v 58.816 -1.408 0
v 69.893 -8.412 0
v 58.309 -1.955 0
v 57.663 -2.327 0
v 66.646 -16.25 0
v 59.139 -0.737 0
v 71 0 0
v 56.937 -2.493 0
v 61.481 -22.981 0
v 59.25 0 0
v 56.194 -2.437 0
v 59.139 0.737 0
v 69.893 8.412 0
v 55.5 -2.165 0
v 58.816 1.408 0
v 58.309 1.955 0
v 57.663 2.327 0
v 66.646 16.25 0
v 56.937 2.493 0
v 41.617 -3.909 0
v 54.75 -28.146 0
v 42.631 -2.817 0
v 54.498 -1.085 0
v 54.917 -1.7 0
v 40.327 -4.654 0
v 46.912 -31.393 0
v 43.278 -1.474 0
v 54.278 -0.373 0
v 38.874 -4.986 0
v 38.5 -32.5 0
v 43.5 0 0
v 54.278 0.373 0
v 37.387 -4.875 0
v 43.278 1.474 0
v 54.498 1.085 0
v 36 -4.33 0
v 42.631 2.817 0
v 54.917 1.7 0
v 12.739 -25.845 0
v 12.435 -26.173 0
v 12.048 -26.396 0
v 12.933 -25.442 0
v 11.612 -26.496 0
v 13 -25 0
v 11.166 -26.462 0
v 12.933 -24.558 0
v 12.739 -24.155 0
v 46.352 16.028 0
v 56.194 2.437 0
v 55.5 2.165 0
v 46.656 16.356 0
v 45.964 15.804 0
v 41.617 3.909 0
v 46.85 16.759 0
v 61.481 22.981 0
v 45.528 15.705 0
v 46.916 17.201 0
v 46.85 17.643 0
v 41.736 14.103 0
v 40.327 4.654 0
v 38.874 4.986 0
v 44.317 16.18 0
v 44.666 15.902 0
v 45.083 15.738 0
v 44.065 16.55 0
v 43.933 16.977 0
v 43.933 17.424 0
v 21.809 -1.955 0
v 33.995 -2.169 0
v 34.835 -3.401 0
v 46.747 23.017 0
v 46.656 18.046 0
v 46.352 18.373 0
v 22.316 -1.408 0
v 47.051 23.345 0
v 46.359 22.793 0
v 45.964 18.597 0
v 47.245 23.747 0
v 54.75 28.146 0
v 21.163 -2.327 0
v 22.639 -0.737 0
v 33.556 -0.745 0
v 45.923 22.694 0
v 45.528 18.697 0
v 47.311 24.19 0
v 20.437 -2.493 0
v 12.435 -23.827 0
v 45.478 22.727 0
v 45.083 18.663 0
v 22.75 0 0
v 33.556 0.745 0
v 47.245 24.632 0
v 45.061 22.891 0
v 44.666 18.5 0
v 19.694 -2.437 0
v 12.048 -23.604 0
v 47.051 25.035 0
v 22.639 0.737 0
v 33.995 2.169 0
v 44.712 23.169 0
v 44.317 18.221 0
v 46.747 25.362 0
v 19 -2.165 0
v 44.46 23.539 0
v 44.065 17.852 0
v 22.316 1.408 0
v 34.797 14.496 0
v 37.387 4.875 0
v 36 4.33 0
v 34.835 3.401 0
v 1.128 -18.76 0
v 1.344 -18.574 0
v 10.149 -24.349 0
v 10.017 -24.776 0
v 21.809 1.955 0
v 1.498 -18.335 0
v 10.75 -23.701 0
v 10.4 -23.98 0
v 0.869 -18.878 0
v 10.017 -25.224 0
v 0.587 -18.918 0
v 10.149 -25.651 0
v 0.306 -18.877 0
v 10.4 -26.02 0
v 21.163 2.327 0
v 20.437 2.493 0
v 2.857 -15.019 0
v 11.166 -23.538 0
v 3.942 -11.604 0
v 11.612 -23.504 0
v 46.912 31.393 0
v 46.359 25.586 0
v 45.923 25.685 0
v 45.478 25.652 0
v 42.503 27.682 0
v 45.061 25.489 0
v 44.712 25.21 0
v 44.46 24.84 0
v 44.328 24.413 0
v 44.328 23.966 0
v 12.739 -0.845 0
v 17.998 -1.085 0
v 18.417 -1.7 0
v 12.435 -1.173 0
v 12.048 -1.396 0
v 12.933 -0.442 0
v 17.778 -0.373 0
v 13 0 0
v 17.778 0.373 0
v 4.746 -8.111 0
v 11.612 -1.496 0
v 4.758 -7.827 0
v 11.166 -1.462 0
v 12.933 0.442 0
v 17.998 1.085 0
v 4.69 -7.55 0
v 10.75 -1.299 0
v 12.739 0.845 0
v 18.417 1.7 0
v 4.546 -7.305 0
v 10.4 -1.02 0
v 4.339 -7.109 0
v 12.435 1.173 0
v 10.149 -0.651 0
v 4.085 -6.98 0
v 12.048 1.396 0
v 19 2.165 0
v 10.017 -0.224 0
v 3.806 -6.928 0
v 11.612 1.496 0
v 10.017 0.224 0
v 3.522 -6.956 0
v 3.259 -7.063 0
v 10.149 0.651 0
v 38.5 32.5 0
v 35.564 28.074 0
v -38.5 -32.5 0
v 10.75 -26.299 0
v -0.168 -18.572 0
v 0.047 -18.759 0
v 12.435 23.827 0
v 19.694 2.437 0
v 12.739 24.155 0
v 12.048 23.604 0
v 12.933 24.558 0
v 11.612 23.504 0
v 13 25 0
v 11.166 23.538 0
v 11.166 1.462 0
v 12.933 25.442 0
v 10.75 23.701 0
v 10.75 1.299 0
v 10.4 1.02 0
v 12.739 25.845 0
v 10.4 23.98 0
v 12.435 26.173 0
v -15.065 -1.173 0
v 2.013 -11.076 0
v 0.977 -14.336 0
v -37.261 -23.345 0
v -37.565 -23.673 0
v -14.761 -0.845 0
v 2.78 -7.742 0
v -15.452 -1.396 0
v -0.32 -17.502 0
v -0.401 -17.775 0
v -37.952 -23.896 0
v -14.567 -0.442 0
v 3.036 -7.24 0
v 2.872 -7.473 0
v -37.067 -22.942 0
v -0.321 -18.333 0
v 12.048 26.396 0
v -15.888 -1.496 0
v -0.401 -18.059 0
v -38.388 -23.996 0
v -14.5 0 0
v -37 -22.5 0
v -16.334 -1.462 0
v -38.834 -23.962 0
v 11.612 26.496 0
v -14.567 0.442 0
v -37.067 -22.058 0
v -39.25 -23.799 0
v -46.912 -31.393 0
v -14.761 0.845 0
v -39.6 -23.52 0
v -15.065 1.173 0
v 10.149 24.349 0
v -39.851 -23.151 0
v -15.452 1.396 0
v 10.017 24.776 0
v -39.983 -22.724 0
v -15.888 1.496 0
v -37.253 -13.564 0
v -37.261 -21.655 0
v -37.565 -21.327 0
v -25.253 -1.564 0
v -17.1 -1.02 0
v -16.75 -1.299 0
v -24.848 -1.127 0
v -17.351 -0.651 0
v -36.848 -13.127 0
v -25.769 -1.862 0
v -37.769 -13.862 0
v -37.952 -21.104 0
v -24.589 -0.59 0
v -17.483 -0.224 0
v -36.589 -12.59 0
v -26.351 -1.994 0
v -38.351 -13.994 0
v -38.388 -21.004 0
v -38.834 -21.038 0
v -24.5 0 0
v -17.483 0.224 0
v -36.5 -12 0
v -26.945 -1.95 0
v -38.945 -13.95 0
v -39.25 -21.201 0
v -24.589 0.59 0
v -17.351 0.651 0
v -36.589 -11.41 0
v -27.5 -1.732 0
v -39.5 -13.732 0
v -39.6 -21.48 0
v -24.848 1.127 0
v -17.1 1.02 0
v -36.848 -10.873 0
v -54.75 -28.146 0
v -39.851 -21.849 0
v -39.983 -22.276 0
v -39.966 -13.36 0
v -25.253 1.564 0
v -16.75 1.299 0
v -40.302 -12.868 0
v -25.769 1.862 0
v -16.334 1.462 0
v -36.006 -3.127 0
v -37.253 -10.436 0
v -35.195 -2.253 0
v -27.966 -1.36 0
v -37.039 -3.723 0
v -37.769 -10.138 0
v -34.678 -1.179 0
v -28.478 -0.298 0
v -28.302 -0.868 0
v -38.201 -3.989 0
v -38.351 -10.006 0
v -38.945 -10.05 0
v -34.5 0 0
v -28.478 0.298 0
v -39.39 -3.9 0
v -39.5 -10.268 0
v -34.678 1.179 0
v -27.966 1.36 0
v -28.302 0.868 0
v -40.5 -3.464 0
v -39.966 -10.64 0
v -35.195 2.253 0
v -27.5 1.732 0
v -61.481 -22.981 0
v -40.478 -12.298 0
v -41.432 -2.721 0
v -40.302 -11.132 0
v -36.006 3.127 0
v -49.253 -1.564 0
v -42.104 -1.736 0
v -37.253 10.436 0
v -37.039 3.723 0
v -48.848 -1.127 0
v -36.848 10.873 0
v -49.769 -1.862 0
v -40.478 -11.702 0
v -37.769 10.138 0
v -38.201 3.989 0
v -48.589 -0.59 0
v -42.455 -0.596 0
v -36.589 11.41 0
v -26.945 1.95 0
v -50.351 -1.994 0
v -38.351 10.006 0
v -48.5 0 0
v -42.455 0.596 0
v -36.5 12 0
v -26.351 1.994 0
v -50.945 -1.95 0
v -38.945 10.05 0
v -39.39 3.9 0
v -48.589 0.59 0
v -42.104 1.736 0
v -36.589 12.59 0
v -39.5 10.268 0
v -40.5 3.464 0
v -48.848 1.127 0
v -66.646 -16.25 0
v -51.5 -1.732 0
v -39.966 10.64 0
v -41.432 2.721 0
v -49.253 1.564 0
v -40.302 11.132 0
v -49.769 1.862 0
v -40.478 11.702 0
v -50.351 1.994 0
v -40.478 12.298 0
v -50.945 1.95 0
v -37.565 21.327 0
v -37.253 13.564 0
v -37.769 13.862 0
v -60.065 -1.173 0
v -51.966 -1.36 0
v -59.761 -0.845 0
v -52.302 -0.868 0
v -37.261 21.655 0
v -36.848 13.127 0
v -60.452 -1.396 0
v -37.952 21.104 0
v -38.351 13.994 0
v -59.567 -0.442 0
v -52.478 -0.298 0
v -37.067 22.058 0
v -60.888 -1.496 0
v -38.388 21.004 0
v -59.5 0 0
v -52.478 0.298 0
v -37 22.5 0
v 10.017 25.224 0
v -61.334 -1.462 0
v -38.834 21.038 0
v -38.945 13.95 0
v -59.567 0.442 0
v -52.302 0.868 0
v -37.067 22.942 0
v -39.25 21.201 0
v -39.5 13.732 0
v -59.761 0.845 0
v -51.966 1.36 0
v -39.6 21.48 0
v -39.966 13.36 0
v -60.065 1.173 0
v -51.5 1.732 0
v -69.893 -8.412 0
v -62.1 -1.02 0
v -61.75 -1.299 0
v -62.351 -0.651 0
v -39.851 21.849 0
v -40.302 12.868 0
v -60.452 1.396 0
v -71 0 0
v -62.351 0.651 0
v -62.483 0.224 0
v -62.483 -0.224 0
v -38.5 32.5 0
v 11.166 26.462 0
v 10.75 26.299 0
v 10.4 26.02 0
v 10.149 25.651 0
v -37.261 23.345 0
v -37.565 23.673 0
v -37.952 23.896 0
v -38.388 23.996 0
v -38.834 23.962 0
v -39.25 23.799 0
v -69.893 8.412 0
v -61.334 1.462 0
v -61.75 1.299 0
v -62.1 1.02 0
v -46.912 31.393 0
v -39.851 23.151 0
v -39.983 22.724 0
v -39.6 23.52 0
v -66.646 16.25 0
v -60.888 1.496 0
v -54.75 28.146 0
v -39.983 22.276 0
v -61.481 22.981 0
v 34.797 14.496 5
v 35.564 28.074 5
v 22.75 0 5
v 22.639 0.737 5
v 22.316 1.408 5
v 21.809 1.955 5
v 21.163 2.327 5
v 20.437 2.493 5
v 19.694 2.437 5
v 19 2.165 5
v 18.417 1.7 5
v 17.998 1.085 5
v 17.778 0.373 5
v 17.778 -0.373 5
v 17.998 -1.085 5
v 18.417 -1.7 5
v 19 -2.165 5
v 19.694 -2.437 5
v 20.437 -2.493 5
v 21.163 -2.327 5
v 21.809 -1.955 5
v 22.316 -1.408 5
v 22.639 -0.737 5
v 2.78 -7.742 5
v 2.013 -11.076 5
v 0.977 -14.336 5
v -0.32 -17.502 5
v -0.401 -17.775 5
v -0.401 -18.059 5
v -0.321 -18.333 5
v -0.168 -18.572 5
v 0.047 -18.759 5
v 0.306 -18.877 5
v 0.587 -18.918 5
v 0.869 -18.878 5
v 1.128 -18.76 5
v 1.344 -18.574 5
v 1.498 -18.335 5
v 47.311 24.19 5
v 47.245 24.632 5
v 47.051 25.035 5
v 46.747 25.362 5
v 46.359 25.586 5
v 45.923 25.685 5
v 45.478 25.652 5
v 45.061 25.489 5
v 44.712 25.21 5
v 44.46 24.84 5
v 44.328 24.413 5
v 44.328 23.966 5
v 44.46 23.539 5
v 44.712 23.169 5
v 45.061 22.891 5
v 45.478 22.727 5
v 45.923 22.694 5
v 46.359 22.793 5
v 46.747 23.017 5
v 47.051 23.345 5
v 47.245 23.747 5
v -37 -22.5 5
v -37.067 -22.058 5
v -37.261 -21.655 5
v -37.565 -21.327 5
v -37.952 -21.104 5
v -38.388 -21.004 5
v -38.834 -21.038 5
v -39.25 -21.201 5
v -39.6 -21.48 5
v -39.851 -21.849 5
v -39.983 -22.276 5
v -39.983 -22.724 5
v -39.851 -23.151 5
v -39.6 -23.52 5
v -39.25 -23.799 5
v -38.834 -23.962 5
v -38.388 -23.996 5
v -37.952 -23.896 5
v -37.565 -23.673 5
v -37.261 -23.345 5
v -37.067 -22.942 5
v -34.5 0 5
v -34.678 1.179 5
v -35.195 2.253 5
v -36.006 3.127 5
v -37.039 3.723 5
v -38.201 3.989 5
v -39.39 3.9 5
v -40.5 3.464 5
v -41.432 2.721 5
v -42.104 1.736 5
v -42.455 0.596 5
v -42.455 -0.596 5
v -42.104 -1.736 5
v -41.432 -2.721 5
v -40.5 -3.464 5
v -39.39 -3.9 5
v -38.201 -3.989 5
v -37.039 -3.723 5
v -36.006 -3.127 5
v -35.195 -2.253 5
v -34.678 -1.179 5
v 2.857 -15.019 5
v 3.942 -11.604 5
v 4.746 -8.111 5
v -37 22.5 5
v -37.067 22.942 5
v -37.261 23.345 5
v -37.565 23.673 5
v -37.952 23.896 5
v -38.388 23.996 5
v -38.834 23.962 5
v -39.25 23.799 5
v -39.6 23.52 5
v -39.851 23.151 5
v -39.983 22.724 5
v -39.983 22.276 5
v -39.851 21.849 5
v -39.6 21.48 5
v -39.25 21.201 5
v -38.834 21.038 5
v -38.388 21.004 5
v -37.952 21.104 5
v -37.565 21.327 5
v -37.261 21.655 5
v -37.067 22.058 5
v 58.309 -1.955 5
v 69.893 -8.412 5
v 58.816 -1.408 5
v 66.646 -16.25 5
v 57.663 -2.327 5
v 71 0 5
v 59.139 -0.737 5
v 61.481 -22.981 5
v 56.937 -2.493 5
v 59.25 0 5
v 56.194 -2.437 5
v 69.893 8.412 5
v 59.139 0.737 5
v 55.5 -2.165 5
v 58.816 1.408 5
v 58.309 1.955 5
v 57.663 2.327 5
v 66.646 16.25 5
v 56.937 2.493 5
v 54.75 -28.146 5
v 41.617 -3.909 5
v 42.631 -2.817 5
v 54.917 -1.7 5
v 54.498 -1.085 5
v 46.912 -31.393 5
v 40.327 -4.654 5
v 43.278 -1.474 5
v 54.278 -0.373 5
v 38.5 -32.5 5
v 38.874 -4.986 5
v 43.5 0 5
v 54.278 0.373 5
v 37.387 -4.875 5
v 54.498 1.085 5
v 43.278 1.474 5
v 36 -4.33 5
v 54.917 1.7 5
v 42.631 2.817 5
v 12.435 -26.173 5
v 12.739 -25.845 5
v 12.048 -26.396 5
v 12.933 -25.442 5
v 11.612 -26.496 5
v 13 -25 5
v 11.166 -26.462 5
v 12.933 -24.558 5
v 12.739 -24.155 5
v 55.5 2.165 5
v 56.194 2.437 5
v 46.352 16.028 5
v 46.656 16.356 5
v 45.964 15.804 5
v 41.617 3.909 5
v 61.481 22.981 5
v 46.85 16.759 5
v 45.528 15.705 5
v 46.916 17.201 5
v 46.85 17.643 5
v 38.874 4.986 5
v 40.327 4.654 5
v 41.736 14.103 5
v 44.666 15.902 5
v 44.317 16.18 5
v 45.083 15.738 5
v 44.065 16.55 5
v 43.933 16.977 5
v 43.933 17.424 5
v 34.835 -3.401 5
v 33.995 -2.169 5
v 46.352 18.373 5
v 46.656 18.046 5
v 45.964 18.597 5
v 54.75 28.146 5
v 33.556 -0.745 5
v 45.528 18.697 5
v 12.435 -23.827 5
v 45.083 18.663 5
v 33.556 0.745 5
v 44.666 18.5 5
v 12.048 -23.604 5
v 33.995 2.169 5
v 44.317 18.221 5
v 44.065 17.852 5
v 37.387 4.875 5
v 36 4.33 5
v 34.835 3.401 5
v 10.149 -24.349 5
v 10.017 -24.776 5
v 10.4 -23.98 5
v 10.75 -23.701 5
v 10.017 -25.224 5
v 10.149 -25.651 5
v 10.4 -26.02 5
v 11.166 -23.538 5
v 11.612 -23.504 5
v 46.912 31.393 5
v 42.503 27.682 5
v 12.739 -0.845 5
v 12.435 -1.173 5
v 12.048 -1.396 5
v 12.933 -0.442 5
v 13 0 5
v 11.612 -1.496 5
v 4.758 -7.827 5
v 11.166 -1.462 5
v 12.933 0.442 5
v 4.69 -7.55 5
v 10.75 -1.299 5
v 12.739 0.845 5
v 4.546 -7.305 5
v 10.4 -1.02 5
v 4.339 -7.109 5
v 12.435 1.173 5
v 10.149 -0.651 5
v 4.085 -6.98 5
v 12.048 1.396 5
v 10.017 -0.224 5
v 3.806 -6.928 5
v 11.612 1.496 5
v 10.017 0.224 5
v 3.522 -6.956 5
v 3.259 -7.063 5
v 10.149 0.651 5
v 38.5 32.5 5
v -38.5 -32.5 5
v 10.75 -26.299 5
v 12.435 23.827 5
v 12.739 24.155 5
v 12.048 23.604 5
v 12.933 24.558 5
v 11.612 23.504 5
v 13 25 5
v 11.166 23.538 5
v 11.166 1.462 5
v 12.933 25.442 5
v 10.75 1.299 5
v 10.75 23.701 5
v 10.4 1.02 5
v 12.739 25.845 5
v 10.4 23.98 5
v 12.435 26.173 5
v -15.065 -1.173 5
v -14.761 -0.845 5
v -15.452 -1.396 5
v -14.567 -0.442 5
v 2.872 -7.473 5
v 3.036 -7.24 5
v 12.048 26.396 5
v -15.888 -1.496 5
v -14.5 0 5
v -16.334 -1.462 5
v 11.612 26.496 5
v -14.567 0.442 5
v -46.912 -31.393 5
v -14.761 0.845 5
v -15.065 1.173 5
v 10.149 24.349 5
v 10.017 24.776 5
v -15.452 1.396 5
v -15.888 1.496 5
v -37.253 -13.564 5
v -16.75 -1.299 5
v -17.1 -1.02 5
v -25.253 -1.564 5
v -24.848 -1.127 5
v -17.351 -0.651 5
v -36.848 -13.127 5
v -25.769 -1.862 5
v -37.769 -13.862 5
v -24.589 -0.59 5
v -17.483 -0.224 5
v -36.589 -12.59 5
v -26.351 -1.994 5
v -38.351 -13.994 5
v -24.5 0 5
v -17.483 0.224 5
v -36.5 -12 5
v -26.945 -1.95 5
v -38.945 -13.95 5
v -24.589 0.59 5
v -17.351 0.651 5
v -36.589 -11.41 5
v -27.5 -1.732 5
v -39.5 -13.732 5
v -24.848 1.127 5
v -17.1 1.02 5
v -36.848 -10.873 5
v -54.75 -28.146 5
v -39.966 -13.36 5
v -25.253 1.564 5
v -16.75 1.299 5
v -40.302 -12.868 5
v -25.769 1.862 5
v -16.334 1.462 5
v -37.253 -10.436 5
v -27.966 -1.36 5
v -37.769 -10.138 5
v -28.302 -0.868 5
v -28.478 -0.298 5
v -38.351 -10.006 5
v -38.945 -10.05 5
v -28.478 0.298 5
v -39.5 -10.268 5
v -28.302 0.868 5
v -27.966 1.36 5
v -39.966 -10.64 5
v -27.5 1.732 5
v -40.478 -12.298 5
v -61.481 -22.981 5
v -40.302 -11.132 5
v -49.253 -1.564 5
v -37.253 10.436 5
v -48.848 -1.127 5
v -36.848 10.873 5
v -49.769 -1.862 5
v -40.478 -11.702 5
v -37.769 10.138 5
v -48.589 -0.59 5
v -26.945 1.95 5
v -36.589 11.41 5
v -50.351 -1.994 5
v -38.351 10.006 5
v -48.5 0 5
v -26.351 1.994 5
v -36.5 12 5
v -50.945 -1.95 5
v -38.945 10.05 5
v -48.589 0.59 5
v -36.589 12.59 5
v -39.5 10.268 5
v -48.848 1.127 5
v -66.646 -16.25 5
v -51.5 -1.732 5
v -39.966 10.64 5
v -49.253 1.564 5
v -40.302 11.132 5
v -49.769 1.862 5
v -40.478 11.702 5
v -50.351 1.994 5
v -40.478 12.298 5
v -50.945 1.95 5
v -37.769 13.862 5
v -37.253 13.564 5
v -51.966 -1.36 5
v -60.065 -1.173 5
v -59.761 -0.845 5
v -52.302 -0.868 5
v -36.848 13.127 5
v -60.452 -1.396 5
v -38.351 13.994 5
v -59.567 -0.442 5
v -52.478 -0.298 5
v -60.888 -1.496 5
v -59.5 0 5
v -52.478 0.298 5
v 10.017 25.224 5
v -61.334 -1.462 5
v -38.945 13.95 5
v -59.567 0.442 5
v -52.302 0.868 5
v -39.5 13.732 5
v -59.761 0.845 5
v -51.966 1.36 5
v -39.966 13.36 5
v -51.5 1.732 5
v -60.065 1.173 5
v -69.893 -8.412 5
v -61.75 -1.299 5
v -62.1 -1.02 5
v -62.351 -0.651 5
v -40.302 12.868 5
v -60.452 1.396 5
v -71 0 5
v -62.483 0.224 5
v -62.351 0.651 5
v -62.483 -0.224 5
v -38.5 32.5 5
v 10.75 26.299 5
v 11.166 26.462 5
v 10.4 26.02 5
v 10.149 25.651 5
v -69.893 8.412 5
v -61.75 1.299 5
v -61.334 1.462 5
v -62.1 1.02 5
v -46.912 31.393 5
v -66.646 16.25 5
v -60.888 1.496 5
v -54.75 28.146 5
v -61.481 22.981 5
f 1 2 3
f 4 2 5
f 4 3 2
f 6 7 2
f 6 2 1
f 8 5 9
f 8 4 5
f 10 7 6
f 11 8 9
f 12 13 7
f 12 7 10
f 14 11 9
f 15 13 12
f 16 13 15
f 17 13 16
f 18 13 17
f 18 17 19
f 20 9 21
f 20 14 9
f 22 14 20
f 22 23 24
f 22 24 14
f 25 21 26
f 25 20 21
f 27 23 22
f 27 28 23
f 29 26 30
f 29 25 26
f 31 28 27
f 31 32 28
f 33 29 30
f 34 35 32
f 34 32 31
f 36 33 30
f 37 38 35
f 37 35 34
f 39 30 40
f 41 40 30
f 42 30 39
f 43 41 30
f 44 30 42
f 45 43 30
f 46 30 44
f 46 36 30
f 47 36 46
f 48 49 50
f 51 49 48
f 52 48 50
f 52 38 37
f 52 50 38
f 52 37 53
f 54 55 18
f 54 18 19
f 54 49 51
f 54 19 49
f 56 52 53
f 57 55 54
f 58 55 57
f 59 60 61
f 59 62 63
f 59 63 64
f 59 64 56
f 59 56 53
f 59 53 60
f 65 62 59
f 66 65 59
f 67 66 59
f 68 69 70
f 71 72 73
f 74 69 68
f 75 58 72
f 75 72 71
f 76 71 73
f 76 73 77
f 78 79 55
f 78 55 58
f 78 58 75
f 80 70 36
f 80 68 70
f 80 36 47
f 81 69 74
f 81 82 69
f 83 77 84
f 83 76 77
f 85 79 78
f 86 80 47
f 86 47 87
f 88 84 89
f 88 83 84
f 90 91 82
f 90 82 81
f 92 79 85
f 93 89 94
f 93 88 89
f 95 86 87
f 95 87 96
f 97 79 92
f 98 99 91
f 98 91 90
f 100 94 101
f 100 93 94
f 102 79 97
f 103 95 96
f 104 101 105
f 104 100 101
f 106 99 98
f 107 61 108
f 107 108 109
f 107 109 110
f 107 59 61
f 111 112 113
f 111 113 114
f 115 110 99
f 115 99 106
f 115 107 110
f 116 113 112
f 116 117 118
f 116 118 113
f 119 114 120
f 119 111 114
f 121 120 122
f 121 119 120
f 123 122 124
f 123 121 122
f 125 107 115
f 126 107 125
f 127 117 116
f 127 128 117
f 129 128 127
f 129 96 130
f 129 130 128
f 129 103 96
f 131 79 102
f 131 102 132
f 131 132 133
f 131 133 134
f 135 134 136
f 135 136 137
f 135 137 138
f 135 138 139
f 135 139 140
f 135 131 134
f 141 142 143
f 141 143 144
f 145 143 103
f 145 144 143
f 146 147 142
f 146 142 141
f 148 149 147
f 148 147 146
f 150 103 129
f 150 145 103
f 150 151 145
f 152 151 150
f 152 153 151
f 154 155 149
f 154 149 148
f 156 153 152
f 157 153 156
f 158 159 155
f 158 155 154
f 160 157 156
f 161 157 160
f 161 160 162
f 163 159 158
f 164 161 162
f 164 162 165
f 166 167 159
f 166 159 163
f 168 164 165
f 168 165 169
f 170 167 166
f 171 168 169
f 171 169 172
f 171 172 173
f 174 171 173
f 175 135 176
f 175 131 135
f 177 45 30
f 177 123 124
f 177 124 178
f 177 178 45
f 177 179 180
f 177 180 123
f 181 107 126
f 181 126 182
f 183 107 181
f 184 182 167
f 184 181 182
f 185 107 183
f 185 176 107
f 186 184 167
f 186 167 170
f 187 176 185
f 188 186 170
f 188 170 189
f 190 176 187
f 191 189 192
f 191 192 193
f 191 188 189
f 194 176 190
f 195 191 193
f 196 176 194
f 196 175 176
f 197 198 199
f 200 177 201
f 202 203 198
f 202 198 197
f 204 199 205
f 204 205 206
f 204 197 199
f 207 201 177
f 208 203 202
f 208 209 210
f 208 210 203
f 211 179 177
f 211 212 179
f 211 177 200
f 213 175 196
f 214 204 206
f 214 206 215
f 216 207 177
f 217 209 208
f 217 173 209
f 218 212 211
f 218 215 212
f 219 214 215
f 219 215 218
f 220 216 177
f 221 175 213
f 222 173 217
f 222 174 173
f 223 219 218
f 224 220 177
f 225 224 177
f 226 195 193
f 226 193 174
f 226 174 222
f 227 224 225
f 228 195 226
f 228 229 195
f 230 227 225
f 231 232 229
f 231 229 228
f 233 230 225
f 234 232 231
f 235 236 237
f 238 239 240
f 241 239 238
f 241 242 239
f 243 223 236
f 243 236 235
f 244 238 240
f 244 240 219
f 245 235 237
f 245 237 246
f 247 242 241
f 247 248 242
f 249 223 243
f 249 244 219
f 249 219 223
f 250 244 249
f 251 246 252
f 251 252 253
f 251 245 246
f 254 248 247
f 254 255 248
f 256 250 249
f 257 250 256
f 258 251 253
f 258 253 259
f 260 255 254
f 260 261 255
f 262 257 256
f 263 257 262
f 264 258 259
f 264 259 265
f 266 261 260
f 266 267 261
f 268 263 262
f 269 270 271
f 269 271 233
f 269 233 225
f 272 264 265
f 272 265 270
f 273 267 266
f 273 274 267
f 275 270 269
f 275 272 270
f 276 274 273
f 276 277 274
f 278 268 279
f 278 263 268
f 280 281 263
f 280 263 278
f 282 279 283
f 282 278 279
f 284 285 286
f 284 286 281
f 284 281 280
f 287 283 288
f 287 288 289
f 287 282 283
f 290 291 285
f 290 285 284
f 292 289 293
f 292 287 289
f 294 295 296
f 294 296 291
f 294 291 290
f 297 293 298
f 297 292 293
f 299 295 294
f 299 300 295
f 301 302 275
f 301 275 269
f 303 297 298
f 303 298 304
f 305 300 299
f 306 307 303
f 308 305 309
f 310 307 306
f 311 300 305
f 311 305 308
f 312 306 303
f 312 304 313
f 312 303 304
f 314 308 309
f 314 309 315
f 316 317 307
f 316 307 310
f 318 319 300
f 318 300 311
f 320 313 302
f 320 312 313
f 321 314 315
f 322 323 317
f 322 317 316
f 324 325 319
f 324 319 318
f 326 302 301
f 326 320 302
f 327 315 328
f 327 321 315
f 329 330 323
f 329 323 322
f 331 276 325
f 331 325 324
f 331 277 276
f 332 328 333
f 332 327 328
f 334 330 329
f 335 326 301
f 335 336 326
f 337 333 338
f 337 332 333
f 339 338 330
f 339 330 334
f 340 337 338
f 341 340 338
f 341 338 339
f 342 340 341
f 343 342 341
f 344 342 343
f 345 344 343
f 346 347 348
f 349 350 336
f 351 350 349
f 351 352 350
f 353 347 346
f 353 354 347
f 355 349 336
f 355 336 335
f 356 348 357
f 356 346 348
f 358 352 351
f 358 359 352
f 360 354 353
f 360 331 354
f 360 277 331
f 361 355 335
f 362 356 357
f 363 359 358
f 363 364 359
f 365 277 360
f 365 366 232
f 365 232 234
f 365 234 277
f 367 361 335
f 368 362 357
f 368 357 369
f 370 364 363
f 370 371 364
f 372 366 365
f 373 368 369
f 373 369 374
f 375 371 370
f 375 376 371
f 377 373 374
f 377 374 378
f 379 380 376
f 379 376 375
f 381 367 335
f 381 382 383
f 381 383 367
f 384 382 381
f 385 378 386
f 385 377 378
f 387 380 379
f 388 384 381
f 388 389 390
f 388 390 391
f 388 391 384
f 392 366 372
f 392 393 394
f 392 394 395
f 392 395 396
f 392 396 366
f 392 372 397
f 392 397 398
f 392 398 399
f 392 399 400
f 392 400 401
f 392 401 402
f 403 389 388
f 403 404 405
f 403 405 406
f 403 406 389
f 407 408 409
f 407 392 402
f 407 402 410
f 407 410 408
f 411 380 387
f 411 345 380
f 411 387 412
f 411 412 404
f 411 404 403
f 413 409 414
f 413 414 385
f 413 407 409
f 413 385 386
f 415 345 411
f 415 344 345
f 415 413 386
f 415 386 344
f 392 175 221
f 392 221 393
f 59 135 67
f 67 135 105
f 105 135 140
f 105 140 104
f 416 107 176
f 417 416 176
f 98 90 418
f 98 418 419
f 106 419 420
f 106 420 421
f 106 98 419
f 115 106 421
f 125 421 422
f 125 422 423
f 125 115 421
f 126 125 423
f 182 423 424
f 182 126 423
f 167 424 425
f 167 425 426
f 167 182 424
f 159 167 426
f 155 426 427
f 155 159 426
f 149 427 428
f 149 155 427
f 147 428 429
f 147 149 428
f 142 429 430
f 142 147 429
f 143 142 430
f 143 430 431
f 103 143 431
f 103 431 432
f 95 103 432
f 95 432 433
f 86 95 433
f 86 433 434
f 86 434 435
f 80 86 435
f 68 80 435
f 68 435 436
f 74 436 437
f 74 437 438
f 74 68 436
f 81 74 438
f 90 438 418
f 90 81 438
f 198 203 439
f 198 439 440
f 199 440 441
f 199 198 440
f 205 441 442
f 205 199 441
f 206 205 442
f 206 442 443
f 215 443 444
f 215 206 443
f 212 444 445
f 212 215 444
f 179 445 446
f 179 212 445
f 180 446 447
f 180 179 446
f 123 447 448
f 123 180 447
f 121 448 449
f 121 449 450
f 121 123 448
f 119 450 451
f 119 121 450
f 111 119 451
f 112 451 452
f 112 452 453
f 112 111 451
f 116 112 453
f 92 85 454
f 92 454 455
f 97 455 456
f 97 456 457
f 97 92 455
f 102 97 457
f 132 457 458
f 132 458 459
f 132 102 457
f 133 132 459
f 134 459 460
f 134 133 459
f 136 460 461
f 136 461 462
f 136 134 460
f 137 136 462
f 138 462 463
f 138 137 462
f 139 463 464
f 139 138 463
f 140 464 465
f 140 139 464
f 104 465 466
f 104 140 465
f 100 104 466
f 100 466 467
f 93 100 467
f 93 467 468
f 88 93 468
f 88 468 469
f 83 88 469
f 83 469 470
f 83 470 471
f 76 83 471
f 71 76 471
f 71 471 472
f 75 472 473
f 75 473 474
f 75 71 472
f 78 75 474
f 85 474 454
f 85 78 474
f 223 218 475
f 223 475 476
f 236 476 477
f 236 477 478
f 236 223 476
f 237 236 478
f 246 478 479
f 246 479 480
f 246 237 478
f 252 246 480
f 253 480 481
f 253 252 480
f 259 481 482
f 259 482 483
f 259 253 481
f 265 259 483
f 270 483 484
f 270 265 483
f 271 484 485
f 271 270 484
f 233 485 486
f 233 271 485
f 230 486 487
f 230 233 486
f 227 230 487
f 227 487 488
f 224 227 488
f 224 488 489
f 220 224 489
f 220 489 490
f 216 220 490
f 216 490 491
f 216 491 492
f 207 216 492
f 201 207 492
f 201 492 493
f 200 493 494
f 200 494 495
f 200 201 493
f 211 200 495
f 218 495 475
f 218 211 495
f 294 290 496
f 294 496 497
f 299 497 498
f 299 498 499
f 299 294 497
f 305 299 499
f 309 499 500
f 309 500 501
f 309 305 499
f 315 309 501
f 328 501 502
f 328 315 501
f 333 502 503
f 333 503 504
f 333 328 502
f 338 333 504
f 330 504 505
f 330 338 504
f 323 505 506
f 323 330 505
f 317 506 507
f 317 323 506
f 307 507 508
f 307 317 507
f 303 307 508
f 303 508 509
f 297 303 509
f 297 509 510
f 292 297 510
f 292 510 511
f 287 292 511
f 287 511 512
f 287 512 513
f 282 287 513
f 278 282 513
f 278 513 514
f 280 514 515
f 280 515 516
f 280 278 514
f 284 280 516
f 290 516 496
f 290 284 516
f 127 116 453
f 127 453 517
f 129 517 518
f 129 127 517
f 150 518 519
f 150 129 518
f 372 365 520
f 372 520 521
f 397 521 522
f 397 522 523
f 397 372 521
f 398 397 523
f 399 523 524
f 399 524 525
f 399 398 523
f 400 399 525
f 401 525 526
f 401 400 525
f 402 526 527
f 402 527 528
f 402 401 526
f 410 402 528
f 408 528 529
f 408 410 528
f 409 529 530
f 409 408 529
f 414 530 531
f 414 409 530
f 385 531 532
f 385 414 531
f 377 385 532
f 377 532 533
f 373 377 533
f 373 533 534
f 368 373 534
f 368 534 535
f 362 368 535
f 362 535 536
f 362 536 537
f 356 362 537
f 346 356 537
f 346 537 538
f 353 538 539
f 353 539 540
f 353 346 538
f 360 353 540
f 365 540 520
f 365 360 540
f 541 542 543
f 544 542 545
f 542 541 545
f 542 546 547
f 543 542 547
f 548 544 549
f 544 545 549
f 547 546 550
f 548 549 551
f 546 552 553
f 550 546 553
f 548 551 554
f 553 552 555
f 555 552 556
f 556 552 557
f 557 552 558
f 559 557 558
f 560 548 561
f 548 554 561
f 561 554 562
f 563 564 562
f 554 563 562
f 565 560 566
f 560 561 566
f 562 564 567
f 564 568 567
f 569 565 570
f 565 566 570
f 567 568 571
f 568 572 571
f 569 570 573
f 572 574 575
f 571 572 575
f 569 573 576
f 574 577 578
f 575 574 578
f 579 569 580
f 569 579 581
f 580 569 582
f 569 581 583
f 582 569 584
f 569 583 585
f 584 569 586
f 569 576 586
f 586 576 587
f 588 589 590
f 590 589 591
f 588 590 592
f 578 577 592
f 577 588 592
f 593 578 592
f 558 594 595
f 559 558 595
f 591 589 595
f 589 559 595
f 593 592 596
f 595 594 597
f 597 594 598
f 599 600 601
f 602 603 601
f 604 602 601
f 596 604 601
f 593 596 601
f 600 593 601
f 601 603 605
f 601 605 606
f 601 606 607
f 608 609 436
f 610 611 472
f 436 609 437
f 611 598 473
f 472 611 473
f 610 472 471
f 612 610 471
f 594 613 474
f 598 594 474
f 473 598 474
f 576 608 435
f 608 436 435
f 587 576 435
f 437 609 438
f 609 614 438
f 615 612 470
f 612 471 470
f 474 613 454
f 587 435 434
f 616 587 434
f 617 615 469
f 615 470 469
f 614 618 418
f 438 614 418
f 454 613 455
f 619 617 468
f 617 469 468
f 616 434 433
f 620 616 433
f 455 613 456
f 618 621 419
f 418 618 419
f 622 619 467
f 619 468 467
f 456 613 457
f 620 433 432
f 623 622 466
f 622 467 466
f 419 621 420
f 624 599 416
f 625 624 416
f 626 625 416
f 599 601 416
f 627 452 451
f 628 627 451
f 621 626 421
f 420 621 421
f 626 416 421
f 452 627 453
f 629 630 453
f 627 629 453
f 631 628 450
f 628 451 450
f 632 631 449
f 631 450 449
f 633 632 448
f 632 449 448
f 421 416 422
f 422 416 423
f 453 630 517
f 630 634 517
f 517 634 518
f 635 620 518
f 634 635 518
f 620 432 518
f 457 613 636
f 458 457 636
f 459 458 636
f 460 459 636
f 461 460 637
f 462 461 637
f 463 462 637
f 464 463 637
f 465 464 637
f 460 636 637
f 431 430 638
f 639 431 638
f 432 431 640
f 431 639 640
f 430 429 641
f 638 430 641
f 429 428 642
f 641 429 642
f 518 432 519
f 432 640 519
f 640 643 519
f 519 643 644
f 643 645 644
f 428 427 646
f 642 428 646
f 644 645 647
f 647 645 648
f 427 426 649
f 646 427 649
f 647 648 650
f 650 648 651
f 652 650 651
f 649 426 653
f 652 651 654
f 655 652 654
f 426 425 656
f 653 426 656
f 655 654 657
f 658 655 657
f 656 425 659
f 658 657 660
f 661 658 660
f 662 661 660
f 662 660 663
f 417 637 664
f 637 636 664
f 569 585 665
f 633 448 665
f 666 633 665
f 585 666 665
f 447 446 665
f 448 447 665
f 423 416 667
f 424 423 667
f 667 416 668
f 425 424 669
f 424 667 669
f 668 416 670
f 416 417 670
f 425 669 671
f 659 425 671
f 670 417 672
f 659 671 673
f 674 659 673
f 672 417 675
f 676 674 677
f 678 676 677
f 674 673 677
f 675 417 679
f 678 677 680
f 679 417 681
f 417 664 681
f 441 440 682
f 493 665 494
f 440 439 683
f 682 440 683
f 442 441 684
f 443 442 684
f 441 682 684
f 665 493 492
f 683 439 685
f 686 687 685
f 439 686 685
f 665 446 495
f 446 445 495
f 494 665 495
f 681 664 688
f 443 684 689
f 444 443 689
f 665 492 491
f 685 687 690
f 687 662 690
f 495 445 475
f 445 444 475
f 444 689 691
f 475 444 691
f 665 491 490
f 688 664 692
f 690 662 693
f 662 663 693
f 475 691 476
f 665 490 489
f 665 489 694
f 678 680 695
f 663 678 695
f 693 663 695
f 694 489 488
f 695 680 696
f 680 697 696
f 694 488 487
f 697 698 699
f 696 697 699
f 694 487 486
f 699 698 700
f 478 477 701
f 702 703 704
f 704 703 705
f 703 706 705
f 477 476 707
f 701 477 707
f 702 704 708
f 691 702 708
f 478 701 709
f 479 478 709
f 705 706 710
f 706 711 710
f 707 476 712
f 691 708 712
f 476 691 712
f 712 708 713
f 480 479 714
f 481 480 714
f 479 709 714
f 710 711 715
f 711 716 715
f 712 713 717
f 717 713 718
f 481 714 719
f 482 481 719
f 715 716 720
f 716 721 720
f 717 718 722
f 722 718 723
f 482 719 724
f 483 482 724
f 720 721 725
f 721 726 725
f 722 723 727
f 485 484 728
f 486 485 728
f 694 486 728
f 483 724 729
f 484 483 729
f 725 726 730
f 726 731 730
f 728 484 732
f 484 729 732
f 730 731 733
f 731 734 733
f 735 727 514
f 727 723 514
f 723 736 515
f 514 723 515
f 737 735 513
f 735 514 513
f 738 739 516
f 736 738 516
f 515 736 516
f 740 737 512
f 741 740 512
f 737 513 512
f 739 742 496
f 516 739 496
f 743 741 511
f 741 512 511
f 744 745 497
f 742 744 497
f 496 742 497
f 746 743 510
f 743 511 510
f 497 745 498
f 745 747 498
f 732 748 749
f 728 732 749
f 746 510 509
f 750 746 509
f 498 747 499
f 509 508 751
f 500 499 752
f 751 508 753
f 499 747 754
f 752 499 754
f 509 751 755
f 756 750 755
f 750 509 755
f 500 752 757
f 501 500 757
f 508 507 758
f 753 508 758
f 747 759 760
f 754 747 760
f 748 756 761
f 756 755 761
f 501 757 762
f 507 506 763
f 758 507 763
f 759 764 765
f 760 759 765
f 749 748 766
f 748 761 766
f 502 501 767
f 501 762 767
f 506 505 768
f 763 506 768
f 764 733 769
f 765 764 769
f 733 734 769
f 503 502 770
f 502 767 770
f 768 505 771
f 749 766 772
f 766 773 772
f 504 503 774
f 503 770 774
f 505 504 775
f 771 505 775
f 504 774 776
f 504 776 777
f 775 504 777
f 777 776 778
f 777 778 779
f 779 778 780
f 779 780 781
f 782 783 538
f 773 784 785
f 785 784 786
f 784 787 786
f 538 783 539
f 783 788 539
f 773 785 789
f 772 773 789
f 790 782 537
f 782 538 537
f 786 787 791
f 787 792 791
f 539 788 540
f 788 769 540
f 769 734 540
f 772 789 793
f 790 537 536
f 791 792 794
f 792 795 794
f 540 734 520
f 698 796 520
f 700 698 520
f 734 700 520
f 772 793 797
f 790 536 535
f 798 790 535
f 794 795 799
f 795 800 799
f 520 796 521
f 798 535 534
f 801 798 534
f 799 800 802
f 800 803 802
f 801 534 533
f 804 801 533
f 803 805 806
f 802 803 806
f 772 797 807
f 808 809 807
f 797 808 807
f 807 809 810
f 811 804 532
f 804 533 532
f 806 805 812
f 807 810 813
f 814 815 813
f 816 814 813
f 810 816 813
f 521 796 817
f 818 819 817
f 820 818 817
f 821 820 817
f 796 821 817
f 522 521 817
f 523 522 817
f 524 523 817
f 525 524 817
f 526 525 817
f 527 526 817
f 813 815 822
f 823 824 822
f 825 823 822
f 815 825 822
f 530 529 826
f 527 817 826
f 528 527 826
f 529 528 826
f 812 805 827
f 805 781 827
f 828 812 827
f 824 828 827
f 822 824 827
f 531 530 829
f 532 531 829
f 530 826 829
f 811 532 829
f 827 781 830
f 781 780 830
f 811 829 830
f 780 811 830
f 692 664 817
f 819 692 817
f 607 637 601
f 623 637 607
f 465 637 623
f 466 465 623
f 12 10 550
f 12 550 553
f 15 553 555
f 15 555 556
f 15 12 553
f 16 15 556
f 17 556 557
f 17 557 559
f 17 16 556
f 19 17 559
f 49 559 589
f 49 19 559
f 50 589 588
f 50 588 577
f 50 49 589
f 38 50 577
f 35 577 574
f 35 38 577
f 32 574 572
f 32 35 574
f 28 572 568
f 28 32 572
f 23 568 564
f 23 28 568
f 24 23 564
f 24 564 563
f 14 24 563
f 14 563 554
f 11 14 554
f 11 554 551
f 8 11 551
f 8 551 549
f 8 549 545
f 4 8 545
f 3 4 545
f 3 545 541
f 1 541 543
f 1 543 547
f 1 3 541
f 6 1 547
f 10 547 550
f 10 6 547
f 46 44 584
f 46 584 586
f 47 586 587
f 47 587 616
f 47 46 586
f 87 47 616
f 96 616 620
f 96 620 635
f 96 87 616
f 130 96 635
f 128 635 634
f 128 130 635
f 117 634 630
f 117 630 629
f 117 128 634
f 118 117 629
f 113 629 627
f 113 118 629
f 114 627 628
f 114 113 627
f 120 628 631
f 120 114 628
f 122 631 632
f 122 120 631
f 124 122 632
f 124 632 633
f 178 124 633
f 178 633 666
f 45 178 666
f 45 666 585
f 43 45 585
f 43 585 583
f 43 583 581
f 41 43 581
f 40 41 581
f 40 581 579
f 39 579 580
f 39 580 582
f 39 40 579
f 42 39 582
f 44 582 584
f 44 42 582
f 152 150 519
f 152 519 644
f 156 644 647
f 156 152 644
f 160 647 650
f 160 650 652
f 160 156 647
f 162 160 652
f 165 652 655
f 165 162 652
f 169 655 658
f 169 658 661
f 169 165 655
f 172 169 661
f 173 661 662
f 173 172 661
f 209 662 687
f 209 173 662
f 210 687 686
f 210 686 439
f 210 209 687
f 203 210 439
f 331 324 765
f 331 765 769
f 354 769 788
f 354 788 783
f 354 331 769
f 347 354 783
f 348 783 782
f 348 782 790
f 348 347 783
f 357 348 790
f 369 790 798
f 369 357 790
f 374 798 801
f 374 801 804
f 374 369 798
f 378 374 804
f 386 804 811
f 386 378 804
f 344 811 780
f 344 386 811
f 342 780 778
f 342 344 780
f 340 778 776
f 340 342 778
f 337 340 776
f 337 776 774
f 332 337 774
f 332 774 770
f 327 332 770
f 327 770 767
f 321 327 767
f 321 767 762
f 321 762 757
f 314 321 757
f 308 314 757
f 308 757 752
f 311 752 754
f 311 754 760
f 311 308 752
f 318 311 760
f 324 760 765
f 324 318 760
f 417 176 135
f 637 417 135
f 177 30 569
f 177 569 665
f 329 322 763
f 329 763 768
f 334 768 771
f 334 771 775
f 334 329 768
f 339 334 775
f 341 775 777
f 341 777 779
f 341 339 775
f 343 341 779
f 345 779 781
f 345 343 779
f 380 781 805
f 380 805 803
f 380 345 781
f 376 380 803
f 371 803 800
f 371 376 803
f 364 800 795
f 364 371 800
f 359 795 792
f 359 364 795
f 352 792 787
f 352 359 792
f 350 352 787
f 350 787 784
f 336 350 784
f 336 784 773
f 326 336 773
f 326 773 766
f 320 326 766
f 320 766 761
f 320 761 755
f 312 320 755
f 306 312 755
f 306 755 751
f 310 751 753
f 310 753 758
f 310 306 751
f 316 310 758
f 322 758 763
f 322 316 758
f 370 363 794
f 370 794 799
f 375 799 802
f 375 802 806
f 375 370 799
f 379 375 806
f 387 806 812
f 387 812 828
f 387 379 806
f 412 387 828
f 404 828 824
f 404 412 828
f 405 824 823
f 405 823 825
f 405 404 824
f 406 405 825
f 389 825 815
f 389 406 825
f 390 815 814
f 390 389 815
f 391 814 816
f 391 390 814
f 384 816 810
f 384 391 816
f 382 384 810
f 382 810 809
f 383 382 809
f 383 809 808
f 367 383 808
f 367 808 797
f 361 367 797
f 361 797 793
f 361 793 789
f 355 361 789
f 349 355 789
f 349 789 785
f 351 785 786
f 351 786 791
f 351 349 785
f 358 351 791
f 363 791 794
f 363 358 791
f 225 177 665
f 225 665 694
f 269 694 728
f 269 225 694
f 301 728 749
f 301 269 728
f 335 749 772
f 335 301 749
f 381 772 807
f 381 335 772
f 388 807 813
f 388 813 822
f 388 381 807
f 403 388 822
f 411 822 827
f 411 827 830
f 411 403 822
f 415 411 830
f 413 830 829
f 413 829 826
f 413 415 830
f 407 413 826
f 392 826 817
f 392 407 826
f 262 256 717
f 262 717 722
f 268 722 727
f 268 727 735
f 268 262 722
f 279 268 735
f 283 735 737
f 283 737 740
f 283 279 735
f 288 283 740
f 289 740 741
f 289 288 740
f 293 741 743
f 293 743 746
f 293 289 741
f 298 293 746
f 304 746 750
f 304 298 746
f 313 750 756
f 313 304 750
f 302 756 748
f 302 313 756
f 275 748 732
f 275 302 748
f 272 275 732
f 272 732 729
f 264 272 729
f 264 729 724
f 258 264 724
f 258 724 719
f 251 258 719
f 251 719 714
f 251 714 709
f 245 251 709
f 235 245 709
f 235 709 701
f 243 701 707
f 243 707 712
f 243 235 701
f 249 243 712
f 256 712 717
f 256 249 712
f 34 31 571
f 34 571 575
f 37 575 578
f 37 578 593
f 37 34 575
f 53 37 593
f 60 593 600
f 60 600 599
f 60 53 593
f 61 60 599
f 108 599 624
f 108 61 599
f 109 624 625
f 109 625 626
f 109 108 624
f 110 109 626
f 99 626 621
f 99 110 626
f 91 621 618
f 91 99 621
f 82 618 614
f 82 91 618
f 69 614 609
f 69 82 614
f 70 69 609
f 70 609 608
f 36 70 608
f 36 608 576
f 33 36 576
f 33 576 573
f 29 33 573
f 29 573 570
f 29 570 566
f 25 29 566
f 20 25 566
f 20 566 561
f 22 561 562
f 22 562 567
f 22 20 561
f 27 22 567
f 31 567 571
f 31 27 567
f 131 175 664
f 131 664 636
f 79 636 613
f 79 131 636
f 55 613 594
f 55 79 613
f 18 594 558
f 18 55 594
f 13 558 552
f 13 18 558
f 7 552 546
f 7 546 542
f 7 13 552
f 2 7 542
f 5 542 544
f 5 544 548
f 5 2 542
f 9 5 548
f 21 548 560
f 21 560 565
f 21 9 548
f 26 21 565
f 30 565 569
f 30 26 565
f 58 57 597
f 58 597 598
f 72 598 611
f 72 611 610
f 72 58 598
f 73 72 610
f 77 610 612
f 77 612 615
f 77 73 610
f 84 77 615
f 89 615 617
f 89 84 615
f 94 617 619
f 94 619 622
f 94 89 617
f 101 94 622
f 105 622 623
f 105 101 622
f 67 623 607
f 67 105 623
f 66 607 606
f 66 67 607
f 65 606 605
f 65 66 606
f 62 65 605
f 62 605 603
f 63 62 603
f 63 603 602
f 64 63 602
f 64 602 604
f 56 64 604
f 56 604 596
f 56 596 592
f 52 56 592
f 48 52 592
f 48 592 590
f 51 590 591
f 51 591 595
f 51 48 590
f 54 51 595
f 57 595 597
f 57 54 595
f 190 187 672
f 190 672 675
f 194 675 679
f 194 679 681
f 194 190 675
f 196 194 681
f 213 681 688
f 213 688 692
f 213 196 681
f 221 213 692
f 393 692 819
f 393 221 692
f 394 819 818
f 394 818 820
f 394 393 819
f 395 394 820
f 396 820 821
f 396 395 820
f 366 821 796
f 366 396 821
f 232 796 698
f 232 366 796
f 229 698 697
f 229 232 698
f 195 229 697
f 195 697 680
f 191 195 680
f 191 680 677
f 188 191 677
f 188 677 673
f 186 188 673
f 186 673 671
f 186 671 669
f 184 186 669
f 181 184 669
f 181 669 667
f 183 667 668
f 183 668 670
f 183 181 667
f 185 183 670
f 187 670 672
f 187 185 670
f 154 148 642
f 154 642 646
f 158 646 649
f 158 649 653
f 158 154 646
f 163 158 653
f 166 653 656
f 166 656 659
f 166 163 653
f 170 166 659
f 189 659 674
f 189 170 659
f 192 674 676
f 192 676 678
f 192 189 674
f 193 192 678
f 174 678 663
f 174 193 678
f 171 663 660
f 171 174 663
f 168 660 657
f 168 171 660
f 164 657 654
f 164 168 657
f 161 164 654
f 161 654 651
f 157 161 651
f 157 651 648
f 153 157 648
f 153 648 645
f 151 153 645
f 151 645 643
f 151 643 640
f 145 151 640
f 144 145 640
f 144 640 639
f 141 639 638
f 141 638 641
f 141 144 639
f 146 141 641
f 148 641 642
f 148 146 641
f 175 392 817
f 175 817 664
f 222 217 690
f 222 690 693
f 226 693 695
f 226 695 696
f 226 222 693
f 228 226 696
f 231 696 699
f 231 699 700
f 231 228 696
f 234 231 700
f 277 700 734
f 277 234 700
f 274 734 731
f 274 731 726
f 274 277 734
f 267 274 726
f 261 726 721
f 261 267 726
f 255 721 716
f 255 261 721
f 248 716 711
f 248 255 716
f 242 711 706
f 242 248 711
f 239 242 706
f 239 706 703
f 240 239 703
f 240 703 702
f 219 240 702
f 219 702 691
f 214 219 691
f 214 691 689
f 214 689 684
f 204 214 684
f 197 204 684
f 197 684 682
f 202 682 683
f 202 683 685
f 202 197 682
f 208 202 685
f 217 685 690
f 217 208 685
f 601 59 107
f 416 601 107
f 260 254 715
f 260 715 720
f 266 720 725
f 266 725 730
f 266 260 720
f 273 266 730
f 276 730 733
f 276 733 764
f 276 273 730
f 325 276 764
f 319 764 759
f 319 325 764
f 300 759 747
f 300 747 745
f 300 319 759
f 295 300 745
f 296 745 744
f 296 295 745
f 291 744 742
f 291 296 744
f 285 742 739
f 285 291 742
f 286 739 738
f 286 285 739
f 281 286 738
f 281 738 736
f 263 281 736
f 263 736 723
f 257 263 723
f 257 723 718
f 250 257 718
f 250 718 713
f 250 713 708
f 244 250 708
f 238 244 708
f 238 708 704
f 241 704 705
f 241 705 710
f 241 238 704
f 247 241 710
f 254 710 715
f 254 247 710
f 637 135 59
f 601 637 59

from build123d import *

# Parameters (mm, degrees)
SKETCH1_R           = 4
SKETCH1_R_2         = 5
SKETCH1_R_3         = 2.5
SKETCH1_R_4         = 2
SKETCH1_R_5         = 1.5
BOSS_EXTRUDE1_DEPTH = 5


with BuildPart() as part:
    # Sketch1 → Boss-Extrude1 (new body)
    with BuildSketch(Plane.XY):
        with BuildLine():
            Line((-38.5, 32.5), (38.5, 32.5))
            ThreePointArc((38.5, 32.5), (71, 0), (38.5, -32.5))
            Line((38.5, -32.5), (-38.5, -32.5))
            ThreePointArc((-38.5, -32.5), (-71, 0), (-38.5, 32.5))
        make_face()
        with Locations((-38.5, 0)):
            Circle(SKETCH1_R, mode=Mode.SUBTRACT)
        with Locations((38.5, 0)):
            Circle(SKETCH1_R_2, mode=Mode.SUBTRACT)
        with Locations((20.25, 0)):
            Circle(SKETCH1_R_3, mode=Mode.SUBTRACT)
        with Locations((56.75, 0)):
            Circle(SKETCH1_R_3, mode=Mode.SUBTRACT)
        with Locations((-38.5, -12)):
            Circle(SKETCH1_R_4, mode=Mode.SUBTRACT)
        with Locations((-26.5, 0)):
            Circle(SKETCH1_R_4, mode=Mode.SUBTRACT)
        with Locations((-38.5, 12)):
            Circle(SKETCH1_R_4, mode=Mode.SUBTRACT)
        with Locations((-50.5, 0)):
            Circle(SKETCH1_R_4, mode=Mode.SUBTRACT)
        with Locations((-38.5, 22.5)):
            Circle(SKETCH1_R_5, mode=Mode.SUBTRACT)
        with Locations((-16, 0)):
            Circle(SKETCH1_R_5, mode=Mode.SUBTRACT)
        with Locations((-38.5, -22.5)):
            Circle(SKETCH1_R_5, mode=Mode.SUBTRACT)
        with Locations((-61, 0)):
            Circle(SKETCH1_R_5, mode=Mode.SUBTRACT)
        with Locations((11.5, 0)):
            Circle(SKETCH1_R_5, mode=Mode.SUBTRACT)
        with Locations((11.5, -25)):
            Circle(SKETCH1_R_5, mode=Mode.SUBTRACT)
        with Locations((11.5, 25)):
            Circle(SKETCH1_R_5, mode=Mode.SUBTRACT)
        with Locations((45.81132848, 24.189554469)):
            Circle(SKETCH1_R_5, mode=Mode.SUBTRACT)
        with Locations((45.416389416, 17.200704553)):
            Circle(SKETCH1_R_5, mode=Mode.SUBTRACT)
        Polygon((42.503089082, 27.681767532), (41.735778899, 14.103430555), (34.796849341, 14.495548626), (35.564159523, 28.073885604), align=None, mode=Mode.SUBTRACT)
        with BuildLine():
            ThreePointArc((-0.320277112, -17.501678783), (0.172057271, -18.827426442), (1.49780493, -18.335092058))
            ThreePointArc((1.49780493, -18.335092058), (3.434628419, -13.322422428), (4.745938398, -8.111030272))
            ThreePointArc((4.745938398, -8.111030272), (3.947417759, -6.943826439), (2.780213925, -7.742347078))
            ThreePointArc((2.780213925, -7.742347078), (1.528508946, -12.716857772), (-0.320277112, -17.501678783))
        make_face(mode=Mode.SUBTRACT)
    extrude(amount=BOSS_EXTRUDE1_DEPTH)


solid = part.part
